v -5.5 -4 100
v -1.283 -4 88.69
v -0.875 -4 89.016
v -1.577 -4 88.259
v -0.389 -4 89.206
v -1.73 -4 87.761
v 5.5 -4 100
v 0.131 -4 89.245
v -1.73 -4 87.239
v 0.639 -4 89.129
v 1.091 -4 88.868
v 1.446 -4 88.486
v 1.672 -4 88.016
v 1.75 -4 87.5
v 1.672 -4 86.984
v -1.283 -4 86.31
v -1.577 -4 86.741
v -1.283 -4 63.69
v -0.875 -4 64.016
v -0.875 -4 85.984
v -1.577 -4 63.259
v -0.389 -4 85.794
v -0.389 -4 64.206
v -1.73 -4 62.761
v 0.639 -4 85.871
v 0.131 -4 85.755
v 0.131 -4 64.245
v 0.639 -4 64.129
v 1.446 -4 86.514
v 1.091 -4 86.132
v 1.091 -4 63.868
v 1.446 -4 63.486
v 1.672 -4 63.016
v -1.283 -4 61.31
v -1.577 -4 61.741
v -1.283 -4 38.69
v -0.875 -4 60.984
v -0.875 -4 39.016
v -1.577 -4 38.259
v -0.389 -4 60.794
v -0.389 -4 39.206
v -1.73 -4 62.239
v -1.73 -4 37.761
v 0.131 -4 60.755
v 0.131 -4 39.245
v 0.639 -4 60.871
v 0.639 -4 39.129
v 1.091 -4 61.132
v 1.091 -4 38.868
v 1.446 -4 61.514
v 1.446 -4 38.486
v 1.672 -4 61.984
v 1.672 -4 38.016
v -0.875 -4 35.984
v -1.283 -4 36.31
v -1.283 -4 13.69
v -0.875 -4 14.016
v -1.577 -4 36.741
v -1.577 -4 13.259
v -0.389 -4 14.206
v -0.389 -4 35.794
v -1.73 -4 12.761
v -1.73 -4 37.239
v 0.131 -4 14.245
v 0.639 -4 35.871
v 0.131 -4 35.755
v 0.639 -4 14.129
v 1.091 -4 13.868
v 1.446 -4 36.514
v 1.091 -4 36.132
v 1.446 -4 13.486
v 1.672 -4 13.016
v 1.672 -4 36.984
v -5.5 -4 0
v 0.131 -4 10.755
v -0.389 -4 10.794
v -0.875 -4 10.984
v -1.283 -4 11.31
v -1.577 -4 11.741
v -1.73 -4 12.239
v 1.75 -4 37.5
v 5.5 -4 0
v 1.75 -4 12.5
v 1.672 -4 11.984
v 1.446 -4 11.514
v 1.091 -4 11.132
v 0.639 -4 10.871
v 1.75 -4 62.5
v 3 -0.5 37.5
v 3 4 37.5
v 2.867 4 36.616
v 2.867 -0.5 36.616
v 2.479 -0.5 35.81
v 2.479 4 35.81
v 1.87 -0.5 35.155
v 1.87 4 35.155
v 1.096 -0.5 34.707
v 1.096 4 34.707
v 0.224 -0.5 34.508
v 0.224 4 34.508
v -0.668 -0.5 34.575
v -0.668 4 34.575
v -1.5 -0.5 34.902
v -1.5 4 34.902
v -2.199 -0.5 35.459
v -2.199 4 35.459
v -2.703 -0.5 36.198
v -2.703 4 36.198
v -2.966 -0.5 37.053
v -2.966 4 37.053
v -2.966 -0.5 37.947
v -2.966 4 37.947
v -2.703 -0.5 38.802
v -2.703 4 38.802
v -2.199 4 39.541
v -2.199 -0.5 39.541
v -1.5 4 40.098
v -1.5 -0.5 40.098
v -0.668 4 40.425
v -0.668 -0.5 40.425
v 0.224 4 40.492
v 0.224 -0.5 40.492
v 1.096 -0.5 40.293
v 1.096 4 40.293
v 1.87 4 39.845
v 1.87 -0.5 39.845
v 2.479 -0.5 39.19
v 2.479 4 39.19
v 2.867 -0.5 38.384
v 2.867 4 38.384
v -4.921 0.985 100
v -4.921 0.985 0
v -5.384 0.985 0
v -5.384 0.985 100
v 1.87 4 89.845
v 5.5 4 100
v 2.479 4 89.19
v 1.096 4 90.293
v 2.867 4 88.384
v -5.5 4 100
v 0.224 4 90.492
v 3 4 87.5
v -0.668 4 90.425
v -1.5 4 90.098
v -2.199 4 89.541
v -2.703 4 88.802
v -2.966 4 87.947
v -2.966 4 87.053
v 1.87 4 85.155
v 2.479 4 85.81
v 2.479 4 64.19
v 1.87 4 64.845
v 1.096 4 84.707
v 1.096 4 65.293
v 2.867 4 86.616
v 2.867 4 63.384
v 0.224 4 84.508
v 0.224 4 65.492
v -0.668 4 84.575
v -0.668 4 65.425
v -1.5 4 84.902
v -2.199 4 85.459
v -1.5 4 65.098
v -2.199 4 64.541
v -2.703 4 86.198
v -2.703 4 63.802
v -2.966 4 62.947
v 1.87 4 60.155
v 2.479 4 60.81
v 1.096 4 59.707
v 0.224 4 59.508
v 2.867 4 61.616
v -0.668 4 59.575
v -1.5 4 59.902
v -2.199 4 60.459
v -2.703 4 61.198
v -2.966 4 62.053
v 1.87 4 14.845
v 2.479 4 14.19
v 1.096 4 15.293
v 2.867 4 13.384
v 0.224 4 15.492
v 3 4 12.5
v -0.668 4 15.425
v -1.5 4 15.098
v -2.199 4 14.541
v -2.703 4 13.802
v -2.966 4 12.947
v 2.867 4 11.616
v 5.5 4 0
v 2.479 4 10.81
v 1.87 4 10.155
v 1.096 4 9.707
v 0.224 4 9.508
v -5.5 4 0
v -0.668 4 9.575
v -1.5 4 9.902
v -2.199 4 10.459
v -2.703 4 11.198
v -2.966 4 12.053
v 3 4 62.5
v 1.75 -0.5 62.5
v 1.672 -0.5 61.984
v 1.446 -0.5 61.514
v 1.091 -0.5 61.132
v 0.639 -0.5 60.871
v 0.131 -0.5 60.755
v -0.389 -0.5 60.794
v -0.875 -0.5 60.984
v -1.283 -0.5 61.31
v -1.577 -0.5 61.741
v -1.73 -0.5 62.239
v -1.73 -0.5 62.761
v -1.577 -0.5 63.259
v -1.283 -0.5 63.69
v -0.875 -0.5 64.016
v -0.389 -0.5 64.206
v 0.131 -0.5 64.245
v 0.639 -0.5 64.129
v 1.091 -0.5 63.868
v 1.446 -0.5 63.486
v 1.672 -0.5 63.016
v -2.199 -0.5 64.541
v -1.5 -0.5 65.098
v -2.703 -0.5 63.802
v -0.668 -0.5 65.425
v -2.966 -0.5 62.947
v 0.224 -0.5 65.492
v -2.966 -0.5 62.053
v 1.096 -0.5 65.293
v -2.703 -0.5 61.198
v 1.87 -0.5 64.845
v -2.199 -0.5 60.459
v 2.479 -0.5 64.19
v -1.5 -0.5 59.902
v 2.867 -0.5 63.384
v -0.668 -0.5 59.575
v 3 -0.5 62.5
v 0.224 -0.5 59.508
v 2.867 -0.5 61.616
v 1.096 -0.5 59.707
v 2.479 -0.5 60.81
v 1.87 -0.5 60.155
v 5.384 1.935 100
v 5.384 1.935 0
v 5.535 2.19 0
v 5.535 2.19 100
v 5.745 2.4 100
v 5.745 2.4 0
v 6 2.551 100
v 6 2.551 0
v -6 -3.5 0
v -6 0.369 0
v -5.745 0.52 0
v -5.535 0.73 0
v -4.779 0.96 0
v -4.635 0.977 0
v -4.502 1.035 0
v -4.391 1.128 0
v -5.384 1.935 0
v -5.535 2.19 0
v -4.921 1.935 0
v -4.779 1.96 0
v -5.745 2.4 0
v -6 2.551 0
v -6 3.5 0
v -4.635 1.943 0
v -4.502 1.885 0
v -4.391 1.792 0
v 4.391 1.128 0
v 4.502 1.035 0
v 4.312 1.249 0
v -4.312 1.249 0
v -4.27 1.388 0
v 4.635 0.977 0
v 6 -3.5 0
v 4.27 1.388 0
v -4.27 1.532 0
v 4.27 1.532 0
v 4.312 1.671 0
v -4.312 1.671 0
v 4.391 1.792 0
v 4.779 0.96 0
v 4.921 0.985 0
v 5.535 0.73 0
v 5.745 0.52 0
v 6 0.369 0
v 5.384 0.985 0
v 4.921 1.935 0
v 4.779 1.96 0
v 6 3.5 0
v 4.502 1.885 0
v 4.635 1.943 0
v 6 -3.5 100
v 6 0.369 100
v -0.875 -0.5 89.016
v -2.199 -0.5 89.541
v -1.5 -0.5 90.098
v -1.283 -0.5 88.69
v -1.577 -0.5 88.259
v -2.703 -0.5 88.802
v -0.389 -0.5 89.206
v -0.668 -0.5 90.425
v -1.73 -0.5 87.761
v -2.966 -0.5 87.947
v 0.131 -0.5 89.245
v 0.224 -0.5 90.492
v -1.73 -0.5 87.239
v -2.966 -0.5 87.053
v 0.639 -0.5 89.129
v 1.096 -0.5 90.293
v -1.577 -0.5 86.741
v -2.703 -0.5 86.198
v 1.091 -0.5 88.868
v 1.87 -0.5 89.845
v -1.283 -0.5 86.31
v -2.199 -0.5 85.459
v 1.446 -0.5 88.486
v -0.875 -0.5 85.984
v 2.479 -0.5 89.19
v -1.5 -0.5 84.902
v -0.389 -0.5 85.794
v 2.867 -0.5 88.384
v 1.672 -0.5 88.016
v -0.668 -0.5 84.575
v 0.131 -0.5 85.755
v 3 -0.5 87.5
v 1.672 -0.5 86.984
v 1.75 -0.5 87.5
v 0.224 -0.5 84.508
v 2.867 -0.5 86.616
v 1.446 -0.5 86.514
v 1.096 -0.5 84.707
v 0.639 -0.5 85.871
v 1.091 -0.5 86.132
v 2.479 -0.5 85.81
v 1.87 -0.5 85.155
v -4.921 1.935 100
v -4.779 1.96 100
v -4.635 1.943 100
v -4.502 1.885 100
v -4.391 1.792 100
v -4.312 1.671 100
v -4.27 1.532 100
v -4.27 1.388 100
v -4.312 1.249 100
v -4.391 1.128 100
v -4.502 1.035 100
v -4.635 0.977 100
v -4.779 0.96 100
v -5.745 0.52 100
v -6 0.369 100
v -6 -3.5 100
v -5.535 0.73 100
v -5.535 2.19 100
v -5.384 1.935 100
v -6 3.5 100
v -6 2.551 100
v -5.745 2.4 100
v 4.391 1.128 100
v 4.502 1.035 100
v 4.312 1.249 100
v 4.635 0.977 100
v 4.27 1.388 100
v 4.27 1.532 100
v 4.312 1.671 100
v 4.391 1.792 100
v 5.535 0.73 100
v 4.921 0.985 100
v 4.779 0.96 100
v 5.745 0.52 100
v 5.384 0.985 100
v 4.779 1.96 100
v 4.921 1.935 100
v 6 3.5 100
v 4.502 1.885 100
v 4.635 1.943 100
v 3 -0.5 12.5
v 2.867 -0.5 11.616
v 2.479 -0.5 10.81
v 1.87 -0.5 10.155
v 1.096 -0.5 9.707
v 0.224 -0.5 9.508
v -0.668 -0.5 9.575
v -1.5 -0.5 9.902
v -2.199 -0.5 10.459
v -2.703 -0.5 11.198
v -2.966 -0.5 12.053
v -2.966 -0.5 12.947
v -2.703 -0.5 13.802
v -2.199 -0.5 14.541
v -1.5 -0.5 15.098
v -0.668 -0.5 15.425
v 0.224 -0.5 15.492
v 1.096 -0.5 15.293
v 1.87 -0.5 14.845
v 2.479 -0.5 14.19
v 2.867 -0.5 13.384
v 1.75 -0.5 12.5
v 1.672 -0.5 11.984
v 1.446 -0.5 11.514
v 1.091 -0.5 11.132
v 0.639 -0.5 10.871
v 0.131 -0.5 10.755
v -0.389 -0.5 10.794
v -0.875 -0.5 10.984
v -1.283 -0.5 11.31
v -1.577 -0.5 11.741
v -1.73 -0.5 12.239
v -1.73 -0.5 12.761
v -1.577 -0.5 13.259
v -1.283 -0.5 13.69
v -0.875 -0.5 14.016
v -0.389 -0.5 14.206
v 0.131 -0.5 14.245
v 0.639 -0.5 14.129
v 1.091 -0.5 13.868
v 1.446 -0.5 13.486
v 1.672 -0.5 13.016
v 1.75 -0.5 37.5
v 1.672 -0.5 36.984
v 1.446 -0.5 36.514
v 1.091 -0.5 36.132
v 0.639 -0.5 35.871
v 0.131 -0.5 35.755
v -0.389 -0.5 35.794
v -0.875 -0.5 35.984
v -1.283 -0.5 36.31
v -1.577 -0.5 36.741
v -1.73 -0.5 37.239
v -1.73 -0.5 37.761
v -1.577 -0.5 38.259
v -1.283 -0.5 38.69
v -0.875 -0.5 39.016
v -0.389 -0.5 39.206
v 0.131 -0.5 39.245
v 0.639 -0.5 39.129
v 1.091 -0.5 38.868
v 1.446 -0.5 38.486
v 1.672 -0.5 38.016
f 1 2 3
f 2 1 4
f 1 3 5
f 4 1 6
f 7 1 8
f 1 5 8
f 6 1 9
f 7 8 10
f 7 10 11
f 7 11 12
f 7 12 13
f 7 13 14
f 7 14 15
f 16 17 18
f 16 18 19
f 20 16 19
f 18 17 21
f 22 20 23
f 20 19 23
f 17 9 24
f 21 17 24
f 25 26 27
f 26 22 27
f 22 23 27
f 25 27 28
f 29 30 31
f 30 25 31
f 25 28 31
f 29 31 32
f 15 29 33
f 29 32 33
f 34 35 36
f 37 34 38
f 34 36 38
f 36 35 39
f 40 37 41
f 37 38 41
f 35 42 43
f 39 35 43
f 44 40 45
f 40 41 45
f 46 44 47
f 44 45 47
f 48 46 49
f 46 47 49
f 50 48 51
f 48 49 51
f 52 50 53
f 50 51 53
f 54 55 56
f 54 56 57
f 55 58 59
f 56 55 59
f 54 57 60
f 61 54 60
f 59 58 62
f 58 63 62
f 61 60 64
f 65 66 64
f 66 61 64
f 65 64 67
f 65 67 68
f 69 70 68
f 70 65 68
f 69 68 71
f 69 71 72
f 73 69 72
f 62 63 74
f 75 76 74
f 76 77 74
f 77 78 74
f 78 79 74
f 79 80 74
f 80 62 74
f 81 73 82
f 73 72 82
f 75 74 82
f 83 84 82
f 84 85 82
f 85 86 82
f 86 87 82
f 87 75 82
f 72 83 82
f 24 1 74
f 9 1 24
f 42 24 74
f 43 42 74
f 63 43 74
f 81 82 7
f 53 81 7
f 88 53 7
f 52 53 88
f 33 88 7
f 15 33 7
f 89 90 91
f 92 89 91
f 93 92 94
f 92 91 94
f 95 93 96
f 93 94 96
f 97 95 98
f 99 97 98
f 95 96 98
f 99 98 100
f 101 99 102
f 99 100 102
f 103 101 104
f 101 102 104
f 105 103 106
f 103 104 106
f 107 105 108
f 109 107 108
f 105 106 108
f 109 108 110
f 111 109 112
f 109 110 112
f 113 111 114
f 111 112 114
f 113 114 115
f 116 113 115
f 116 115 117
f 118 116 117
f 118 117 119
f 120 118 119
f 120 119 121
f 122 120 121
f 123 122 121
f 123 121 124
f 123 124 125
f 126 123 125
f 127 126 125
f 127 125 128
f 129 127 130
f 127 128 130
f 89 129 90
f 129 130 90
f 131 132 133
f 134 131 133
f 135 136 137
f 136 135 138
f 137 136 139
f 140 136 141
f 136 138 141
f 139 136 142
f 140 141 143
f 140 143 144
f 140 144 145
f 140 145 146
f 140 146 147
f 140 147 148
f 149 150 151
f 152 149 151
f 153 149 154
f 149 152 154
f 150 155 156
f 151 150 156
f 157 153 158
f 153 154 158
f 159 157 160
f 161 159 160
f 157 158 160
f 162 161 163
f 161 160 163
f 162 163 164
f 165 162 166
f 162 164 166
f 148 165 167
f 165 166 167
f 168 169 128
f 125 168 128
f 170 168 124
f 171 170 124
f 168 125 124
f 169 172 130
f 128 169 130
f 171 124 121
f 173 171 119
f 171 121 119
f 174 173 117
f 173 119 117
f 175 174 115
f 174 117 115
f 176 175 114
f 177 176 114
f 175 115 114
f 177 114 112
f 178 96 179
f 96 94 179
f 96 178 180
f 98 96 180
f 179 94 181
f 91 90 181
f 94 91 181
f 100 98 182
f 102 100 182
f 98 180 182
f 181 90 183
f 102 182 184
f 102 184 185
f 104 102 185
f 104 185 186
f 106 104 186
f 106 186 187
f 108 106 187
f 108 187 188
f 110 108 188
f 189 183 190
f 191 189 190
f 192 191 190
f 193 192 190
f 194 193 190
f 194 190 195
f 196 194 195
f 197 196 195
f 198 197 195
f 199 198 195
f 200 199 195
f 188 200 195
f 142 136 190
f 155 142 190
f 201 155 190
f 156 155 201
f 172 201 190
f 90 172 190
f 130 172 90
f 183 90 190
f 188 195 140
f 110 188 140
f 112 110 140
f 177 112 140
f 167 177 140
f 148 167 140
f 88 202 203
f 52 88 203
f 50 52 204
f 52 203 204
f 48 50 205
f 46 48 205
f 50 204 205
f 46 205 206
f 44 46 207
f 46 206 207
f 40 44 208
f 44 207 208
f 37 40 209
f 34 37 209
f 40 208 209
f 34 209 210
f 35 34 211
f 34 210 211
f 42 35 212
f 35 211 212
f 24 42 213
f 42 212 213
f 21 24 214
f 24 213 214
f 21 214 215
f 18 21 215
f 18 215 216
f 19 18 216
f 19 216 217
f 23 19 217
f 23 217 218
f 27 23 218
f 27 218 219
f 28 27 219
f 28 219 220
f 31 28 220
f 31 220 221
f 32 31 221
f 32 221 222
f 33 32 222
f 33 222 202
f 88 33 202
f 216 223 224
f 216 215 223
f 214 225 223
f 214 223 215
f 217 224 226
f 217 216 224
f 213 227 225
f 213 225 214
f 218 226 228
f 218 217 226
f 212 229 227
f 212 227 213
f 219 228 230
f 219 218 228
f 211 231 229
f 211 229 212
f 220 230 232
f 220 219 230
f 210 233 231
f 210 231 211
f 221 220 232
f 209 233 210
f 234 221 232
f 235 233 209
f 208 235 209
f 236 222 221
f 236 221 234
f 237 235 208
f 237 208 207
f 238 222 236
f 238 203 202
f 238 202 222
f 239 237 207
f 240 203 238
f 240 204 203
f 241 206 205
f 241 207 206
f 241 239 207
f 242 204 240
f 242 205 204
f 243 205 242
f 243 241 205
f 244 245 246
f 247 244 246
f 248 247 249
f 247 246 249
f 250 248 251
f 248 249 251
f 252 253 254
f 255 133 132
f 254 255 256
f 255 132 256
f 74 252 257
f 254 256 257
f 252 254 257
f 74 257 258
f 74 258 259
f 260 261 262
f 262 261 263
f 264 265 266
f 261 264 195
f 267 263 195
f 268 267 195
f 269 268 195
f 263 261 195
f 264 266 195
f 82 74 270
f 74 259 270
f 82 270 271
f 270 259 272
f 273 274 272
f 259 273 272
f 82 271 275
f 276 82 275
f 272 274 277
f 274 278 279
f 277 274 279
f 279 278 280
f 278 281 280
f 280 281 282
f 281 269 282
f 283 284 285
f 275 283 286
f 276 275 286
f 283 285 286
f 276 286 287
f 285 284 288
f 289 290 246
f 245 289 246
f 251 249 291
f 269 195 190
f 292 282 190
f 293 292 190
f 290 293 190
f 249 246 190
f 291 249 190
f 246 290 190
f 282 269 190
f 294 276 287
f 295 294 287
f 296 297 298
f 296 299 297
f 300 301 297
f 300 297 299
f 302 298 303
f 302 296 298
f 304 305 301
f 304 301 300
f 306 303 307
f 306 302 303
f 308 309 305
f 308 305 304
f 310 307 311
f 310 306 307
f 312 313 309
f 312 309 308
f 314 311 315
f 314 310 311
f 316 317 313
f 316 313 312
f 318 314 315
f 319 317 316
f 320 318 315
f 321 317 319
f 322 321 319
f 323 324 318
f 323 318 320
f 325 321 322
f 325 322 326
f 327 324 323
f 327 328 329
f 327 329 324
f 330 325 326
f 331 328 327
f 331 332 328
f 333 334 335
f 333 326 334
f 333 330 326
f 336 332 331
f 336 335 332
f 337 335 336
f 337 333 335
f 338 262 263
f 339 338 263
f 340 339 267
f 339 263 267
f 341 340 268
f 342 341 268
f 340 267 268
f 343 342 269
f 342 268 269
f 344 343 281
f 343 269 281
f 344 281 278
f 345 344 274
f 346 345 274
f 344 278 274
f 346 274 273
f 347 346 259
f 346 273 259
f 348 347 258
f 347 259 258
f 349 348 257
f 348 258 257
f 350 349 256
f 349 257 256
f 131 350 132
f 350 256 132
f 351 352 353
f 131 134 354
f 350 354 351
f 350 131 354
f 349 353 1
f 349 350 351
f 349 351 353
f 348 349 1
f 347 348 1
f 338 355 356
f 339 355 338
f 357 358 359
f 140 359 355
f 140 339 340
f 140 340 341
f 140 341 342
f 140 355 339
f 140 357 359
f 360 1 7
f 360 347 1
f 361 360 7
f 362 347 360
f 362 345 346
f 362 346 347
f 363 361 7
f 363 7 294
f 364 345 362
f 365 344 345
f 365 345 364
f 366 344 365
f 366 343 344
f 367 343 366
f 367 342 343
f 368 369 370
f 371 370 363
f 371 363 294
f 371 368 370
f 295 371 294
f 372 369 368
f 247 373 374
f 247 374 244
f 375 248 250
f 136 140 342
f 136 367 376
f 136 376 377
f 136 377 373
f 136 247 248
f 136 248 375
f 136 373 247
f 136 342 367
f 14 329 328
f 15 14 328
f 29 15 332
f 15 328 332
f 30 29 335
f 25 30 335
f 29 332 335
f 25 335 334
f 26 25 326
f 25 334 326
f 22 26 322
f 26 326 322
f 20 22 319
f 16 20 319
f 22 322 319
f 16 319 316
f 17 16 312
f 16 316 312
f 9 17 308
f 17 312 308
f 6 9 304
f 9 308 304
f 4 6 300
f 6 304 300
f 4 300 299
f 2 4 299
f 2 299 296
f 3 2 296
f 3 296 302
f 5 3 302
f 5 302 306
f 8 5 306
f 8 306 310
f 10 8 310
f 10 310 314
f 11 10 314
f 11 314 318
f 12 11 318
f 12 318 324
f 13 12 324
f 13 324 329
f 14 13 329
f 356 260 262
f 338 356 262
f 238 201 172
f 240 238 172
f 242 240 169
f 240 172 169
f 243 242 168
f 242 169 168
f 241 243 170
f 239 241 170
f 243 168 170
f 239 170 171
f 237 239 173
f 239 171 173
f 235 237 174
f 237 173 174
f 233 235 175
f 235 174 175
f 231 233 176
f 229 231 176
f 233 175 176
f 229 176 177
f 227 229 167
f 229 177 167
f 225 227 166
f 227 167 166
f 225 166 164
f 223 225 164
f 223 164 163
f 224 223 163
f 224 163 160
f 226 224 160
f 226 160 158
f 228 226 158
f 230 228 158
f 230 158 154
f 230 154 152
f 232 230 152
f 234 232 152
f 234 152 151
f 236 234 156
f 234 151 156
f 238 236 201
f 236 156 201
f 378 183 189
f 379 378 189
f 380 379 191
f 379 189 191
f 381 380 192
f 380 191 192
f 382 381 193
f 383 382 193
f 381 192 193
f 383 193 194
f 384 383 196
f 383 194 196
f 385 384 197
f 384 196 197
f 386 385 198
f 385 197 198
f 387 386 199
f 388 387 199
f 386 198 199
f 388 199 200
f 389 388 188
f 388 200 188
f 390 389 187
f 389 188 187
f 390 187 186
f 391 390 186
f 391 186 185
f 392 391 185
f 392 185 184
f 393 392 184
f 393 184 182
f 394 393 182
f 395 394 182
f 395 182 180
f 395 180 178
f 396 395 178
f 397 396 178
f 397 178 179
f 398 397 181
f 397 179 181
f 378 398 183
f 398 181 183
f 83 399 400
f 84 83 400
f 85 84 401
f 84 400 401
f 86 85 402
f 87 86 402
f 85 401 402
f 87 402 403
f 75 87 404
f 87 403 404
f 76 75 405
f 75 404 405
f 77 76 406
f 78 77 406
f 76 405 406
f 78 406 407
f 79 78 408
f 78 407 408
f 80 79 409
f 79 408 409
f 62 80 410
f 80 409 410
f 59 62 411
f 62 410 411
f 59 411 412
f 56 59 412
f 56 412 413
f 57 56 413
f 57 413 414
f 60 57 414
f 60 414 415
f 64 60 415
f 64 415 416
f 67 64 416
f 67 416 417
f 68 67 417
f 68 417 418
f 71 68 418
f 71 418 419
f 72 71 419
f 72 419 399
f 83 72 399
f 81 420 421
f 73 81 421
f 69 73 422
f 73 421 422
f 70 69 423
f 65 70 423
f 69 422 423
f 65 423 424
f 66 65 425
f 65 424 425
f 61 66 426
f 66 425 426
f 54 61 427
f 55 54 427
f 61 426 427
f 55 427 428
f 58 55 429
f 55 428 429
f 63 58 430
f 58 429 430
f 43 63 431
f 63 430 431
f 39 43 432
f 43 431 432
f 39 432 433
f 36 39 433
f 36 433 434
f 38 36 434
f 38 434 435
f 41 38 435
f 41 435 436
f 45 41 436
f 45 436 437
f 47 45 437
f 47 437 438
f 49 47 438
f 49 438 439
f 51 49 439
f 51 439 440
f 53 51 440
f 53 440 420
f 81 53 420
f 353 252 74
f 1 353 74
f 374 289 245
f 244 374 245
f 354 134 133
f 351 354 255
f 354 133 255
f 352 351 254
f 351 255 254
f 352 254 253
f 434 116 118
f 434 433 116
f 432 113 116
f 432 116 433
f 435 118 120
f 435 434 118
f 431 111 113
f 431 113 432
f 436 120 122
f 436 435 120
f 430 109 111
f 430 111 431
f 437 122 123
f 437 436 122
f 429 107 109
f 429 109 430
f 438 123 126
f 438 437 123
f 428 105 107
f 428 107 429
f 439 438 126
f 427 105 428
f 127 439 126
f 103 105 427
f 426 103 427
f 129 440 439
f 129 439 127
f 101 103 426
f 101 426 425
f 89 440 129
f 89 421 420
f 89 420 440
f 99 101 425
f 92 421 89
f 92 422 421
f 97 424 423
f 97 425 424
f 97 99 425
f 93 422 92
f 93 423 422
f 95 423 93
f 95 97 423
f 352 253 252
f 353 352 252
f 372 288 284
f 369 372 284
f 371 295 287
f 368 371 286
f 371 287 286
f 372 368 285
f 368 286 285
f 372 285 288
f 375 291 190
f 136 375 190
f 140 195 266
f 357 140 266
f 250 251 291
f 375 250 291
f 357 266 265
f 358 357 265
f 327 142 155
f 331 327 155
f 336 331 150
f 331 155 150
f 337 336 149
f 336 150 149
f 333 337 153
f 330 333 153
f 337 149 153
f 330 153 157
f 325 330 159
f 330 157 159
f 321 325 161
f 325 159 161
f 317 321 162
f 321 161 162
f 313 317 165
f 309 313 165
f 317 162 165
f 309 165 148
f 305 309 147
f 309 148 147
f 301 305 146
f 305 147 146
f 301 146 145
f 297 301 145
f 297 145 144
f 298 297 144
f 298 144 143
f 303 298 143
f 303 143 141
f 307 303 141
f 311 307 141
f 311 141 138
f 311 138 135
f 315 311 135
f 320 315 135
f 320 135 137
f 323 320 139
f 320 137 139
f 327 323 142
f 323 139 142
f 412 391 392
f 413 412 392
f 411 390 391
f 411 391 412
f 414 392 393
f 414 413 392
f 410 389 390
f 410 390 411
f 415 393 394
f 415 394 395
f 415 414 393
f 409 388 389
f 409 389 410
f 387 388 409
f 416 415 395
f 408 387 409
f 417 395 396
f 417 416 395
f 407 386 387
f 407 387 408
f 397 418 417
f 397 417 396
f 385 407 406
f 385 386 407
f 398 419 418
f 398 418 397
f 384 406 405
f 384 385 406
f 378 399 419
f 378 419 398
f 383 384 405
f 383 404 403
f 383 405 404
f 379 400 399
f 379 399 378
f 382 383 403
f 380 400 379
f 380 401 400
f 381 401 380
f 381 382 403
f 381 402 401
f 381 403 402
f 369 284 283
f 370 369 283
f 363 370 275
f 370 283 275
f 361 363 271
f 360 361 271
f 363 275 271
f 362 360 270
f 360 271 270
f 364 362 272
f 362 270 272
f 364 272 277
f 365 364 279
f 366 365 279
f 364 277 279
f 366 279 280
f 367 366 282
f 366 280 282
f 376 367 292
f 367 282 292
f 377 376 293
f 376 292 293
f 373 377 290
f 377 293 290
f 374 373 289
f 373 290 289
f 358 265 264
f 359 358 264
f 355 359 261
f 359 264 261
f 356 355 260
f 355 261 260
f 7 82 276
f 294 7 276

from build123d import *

# Parameters (mm, degrees)
BOSS_EXTRUDE1_DEPTH = 100
SKETCH2_R           = 3
CUT_EXTRUDE1_DEPTH  = 4.5
SKETCH3_R           = 1.75
CUT_EXTRUDE2_DEPTH  = 4.5
LPATTERN1_COUNT     = 4
LPATTERN1_PITCH     = 25


with BuildPart() as part:
    # Sketch1 → Boss-Extrude1 (new body)
    with BuildSketch(Plane.XY):
        with BuildLine():
            Line((6, -3.5), (6, 0.368911094))
            ThreePointArc((6, 0.368911094), (5.63354293, 0.61854293), (5.383911094, 0.985))
            Line((5.383911094, 0.985), (4.92112495, 0.985))
            ThreePointArc((4.92112495, 0.985), (4.265, 1.46), (4.92112495, 1.935))
            Line((4.92112495, 1.935), (5.383911094, 1.935))
            ThreePointArc((5.383911094, 1.935), (5.63354293, 2.30145707), (6, 2.551088906))
            Line((6, 2.551088906), (6, 3.5))
            Line((6, 3.5), (5.5, 4))
            Line((5.5, 4), (-5.5, 4))
            Line((-5.5, 4), (-6, 3.5))
            Line((-6, 3.5), (-6, 2.551088906))
            ThreePointArc((-6, 2.551088906), (-5.63354293, 2.30145707), (-5.383911094, 1.935))
            Line((-5.383911094, 1.935), (-4.92112495, 1.935))
            ThreePointArc((-4.92112495, 1.935), (-4.265, 1.46), (-4.92112495, 0.985))
            Line((-4.92112495, 0.985), (-5.383911094, 0.985))
            ThreePointArc((-5.383911094, 0.985), (-5.63354293, 0.61854293), (-6, 0.368911094))
            Line((-6, 0.368911094), (-6, -3.5))
            Line((-6, -3.5), (-5.5, -4))
            Line((-5.5, -4), (5.5, -4))
            Line((5.5, -4), (6, -3.5))
        make_face()
    extrude(amount=BOSS_EXTRUDE1_DEPTH)

    # Sketch2 → Cut-Extrude1 (cut)
    with BuildSketch(Plane(origin=(0, 4, 0), x_dir=(1, 0, 0), z_dir=(0, 1, 0))):
        with Locations((0, -12.5)):
            Circle(SKETCH2_R)
    cut_extrude1 = extrude(amount=-CUT_EXTRUDE1_DEPTH, mode=Mode.SUBTRACT)

    # Sketch3 → Cut-Extrude2 (cut, through all)
    with BuildSketch(Plane(origin=(0, -0.5, 0), x_dir=(1, 0, 0), z_dir=(0, 1, 0))):
        with Locations((0, -12.5)):
            Circle(SKETCH3_R)
    cut_extrude2 = extrude(amount=-CUT_EXTRUDE2_DEPTH, mode=Mode.SUBTRACT)

    # LPattern1: Cut-Extrude1, Cut-Extrude2 ×4
    with Locations(*[(0, 0, i * LPATTERN1_PITCH) for i in range(1, LPATTERN1_COUNT)]):
        add(cut_extrude1, mode=Mode.SUBTRACT)
        add(cut_extrude2, mode=Mode.SUBTRACT)


solid = part.part
